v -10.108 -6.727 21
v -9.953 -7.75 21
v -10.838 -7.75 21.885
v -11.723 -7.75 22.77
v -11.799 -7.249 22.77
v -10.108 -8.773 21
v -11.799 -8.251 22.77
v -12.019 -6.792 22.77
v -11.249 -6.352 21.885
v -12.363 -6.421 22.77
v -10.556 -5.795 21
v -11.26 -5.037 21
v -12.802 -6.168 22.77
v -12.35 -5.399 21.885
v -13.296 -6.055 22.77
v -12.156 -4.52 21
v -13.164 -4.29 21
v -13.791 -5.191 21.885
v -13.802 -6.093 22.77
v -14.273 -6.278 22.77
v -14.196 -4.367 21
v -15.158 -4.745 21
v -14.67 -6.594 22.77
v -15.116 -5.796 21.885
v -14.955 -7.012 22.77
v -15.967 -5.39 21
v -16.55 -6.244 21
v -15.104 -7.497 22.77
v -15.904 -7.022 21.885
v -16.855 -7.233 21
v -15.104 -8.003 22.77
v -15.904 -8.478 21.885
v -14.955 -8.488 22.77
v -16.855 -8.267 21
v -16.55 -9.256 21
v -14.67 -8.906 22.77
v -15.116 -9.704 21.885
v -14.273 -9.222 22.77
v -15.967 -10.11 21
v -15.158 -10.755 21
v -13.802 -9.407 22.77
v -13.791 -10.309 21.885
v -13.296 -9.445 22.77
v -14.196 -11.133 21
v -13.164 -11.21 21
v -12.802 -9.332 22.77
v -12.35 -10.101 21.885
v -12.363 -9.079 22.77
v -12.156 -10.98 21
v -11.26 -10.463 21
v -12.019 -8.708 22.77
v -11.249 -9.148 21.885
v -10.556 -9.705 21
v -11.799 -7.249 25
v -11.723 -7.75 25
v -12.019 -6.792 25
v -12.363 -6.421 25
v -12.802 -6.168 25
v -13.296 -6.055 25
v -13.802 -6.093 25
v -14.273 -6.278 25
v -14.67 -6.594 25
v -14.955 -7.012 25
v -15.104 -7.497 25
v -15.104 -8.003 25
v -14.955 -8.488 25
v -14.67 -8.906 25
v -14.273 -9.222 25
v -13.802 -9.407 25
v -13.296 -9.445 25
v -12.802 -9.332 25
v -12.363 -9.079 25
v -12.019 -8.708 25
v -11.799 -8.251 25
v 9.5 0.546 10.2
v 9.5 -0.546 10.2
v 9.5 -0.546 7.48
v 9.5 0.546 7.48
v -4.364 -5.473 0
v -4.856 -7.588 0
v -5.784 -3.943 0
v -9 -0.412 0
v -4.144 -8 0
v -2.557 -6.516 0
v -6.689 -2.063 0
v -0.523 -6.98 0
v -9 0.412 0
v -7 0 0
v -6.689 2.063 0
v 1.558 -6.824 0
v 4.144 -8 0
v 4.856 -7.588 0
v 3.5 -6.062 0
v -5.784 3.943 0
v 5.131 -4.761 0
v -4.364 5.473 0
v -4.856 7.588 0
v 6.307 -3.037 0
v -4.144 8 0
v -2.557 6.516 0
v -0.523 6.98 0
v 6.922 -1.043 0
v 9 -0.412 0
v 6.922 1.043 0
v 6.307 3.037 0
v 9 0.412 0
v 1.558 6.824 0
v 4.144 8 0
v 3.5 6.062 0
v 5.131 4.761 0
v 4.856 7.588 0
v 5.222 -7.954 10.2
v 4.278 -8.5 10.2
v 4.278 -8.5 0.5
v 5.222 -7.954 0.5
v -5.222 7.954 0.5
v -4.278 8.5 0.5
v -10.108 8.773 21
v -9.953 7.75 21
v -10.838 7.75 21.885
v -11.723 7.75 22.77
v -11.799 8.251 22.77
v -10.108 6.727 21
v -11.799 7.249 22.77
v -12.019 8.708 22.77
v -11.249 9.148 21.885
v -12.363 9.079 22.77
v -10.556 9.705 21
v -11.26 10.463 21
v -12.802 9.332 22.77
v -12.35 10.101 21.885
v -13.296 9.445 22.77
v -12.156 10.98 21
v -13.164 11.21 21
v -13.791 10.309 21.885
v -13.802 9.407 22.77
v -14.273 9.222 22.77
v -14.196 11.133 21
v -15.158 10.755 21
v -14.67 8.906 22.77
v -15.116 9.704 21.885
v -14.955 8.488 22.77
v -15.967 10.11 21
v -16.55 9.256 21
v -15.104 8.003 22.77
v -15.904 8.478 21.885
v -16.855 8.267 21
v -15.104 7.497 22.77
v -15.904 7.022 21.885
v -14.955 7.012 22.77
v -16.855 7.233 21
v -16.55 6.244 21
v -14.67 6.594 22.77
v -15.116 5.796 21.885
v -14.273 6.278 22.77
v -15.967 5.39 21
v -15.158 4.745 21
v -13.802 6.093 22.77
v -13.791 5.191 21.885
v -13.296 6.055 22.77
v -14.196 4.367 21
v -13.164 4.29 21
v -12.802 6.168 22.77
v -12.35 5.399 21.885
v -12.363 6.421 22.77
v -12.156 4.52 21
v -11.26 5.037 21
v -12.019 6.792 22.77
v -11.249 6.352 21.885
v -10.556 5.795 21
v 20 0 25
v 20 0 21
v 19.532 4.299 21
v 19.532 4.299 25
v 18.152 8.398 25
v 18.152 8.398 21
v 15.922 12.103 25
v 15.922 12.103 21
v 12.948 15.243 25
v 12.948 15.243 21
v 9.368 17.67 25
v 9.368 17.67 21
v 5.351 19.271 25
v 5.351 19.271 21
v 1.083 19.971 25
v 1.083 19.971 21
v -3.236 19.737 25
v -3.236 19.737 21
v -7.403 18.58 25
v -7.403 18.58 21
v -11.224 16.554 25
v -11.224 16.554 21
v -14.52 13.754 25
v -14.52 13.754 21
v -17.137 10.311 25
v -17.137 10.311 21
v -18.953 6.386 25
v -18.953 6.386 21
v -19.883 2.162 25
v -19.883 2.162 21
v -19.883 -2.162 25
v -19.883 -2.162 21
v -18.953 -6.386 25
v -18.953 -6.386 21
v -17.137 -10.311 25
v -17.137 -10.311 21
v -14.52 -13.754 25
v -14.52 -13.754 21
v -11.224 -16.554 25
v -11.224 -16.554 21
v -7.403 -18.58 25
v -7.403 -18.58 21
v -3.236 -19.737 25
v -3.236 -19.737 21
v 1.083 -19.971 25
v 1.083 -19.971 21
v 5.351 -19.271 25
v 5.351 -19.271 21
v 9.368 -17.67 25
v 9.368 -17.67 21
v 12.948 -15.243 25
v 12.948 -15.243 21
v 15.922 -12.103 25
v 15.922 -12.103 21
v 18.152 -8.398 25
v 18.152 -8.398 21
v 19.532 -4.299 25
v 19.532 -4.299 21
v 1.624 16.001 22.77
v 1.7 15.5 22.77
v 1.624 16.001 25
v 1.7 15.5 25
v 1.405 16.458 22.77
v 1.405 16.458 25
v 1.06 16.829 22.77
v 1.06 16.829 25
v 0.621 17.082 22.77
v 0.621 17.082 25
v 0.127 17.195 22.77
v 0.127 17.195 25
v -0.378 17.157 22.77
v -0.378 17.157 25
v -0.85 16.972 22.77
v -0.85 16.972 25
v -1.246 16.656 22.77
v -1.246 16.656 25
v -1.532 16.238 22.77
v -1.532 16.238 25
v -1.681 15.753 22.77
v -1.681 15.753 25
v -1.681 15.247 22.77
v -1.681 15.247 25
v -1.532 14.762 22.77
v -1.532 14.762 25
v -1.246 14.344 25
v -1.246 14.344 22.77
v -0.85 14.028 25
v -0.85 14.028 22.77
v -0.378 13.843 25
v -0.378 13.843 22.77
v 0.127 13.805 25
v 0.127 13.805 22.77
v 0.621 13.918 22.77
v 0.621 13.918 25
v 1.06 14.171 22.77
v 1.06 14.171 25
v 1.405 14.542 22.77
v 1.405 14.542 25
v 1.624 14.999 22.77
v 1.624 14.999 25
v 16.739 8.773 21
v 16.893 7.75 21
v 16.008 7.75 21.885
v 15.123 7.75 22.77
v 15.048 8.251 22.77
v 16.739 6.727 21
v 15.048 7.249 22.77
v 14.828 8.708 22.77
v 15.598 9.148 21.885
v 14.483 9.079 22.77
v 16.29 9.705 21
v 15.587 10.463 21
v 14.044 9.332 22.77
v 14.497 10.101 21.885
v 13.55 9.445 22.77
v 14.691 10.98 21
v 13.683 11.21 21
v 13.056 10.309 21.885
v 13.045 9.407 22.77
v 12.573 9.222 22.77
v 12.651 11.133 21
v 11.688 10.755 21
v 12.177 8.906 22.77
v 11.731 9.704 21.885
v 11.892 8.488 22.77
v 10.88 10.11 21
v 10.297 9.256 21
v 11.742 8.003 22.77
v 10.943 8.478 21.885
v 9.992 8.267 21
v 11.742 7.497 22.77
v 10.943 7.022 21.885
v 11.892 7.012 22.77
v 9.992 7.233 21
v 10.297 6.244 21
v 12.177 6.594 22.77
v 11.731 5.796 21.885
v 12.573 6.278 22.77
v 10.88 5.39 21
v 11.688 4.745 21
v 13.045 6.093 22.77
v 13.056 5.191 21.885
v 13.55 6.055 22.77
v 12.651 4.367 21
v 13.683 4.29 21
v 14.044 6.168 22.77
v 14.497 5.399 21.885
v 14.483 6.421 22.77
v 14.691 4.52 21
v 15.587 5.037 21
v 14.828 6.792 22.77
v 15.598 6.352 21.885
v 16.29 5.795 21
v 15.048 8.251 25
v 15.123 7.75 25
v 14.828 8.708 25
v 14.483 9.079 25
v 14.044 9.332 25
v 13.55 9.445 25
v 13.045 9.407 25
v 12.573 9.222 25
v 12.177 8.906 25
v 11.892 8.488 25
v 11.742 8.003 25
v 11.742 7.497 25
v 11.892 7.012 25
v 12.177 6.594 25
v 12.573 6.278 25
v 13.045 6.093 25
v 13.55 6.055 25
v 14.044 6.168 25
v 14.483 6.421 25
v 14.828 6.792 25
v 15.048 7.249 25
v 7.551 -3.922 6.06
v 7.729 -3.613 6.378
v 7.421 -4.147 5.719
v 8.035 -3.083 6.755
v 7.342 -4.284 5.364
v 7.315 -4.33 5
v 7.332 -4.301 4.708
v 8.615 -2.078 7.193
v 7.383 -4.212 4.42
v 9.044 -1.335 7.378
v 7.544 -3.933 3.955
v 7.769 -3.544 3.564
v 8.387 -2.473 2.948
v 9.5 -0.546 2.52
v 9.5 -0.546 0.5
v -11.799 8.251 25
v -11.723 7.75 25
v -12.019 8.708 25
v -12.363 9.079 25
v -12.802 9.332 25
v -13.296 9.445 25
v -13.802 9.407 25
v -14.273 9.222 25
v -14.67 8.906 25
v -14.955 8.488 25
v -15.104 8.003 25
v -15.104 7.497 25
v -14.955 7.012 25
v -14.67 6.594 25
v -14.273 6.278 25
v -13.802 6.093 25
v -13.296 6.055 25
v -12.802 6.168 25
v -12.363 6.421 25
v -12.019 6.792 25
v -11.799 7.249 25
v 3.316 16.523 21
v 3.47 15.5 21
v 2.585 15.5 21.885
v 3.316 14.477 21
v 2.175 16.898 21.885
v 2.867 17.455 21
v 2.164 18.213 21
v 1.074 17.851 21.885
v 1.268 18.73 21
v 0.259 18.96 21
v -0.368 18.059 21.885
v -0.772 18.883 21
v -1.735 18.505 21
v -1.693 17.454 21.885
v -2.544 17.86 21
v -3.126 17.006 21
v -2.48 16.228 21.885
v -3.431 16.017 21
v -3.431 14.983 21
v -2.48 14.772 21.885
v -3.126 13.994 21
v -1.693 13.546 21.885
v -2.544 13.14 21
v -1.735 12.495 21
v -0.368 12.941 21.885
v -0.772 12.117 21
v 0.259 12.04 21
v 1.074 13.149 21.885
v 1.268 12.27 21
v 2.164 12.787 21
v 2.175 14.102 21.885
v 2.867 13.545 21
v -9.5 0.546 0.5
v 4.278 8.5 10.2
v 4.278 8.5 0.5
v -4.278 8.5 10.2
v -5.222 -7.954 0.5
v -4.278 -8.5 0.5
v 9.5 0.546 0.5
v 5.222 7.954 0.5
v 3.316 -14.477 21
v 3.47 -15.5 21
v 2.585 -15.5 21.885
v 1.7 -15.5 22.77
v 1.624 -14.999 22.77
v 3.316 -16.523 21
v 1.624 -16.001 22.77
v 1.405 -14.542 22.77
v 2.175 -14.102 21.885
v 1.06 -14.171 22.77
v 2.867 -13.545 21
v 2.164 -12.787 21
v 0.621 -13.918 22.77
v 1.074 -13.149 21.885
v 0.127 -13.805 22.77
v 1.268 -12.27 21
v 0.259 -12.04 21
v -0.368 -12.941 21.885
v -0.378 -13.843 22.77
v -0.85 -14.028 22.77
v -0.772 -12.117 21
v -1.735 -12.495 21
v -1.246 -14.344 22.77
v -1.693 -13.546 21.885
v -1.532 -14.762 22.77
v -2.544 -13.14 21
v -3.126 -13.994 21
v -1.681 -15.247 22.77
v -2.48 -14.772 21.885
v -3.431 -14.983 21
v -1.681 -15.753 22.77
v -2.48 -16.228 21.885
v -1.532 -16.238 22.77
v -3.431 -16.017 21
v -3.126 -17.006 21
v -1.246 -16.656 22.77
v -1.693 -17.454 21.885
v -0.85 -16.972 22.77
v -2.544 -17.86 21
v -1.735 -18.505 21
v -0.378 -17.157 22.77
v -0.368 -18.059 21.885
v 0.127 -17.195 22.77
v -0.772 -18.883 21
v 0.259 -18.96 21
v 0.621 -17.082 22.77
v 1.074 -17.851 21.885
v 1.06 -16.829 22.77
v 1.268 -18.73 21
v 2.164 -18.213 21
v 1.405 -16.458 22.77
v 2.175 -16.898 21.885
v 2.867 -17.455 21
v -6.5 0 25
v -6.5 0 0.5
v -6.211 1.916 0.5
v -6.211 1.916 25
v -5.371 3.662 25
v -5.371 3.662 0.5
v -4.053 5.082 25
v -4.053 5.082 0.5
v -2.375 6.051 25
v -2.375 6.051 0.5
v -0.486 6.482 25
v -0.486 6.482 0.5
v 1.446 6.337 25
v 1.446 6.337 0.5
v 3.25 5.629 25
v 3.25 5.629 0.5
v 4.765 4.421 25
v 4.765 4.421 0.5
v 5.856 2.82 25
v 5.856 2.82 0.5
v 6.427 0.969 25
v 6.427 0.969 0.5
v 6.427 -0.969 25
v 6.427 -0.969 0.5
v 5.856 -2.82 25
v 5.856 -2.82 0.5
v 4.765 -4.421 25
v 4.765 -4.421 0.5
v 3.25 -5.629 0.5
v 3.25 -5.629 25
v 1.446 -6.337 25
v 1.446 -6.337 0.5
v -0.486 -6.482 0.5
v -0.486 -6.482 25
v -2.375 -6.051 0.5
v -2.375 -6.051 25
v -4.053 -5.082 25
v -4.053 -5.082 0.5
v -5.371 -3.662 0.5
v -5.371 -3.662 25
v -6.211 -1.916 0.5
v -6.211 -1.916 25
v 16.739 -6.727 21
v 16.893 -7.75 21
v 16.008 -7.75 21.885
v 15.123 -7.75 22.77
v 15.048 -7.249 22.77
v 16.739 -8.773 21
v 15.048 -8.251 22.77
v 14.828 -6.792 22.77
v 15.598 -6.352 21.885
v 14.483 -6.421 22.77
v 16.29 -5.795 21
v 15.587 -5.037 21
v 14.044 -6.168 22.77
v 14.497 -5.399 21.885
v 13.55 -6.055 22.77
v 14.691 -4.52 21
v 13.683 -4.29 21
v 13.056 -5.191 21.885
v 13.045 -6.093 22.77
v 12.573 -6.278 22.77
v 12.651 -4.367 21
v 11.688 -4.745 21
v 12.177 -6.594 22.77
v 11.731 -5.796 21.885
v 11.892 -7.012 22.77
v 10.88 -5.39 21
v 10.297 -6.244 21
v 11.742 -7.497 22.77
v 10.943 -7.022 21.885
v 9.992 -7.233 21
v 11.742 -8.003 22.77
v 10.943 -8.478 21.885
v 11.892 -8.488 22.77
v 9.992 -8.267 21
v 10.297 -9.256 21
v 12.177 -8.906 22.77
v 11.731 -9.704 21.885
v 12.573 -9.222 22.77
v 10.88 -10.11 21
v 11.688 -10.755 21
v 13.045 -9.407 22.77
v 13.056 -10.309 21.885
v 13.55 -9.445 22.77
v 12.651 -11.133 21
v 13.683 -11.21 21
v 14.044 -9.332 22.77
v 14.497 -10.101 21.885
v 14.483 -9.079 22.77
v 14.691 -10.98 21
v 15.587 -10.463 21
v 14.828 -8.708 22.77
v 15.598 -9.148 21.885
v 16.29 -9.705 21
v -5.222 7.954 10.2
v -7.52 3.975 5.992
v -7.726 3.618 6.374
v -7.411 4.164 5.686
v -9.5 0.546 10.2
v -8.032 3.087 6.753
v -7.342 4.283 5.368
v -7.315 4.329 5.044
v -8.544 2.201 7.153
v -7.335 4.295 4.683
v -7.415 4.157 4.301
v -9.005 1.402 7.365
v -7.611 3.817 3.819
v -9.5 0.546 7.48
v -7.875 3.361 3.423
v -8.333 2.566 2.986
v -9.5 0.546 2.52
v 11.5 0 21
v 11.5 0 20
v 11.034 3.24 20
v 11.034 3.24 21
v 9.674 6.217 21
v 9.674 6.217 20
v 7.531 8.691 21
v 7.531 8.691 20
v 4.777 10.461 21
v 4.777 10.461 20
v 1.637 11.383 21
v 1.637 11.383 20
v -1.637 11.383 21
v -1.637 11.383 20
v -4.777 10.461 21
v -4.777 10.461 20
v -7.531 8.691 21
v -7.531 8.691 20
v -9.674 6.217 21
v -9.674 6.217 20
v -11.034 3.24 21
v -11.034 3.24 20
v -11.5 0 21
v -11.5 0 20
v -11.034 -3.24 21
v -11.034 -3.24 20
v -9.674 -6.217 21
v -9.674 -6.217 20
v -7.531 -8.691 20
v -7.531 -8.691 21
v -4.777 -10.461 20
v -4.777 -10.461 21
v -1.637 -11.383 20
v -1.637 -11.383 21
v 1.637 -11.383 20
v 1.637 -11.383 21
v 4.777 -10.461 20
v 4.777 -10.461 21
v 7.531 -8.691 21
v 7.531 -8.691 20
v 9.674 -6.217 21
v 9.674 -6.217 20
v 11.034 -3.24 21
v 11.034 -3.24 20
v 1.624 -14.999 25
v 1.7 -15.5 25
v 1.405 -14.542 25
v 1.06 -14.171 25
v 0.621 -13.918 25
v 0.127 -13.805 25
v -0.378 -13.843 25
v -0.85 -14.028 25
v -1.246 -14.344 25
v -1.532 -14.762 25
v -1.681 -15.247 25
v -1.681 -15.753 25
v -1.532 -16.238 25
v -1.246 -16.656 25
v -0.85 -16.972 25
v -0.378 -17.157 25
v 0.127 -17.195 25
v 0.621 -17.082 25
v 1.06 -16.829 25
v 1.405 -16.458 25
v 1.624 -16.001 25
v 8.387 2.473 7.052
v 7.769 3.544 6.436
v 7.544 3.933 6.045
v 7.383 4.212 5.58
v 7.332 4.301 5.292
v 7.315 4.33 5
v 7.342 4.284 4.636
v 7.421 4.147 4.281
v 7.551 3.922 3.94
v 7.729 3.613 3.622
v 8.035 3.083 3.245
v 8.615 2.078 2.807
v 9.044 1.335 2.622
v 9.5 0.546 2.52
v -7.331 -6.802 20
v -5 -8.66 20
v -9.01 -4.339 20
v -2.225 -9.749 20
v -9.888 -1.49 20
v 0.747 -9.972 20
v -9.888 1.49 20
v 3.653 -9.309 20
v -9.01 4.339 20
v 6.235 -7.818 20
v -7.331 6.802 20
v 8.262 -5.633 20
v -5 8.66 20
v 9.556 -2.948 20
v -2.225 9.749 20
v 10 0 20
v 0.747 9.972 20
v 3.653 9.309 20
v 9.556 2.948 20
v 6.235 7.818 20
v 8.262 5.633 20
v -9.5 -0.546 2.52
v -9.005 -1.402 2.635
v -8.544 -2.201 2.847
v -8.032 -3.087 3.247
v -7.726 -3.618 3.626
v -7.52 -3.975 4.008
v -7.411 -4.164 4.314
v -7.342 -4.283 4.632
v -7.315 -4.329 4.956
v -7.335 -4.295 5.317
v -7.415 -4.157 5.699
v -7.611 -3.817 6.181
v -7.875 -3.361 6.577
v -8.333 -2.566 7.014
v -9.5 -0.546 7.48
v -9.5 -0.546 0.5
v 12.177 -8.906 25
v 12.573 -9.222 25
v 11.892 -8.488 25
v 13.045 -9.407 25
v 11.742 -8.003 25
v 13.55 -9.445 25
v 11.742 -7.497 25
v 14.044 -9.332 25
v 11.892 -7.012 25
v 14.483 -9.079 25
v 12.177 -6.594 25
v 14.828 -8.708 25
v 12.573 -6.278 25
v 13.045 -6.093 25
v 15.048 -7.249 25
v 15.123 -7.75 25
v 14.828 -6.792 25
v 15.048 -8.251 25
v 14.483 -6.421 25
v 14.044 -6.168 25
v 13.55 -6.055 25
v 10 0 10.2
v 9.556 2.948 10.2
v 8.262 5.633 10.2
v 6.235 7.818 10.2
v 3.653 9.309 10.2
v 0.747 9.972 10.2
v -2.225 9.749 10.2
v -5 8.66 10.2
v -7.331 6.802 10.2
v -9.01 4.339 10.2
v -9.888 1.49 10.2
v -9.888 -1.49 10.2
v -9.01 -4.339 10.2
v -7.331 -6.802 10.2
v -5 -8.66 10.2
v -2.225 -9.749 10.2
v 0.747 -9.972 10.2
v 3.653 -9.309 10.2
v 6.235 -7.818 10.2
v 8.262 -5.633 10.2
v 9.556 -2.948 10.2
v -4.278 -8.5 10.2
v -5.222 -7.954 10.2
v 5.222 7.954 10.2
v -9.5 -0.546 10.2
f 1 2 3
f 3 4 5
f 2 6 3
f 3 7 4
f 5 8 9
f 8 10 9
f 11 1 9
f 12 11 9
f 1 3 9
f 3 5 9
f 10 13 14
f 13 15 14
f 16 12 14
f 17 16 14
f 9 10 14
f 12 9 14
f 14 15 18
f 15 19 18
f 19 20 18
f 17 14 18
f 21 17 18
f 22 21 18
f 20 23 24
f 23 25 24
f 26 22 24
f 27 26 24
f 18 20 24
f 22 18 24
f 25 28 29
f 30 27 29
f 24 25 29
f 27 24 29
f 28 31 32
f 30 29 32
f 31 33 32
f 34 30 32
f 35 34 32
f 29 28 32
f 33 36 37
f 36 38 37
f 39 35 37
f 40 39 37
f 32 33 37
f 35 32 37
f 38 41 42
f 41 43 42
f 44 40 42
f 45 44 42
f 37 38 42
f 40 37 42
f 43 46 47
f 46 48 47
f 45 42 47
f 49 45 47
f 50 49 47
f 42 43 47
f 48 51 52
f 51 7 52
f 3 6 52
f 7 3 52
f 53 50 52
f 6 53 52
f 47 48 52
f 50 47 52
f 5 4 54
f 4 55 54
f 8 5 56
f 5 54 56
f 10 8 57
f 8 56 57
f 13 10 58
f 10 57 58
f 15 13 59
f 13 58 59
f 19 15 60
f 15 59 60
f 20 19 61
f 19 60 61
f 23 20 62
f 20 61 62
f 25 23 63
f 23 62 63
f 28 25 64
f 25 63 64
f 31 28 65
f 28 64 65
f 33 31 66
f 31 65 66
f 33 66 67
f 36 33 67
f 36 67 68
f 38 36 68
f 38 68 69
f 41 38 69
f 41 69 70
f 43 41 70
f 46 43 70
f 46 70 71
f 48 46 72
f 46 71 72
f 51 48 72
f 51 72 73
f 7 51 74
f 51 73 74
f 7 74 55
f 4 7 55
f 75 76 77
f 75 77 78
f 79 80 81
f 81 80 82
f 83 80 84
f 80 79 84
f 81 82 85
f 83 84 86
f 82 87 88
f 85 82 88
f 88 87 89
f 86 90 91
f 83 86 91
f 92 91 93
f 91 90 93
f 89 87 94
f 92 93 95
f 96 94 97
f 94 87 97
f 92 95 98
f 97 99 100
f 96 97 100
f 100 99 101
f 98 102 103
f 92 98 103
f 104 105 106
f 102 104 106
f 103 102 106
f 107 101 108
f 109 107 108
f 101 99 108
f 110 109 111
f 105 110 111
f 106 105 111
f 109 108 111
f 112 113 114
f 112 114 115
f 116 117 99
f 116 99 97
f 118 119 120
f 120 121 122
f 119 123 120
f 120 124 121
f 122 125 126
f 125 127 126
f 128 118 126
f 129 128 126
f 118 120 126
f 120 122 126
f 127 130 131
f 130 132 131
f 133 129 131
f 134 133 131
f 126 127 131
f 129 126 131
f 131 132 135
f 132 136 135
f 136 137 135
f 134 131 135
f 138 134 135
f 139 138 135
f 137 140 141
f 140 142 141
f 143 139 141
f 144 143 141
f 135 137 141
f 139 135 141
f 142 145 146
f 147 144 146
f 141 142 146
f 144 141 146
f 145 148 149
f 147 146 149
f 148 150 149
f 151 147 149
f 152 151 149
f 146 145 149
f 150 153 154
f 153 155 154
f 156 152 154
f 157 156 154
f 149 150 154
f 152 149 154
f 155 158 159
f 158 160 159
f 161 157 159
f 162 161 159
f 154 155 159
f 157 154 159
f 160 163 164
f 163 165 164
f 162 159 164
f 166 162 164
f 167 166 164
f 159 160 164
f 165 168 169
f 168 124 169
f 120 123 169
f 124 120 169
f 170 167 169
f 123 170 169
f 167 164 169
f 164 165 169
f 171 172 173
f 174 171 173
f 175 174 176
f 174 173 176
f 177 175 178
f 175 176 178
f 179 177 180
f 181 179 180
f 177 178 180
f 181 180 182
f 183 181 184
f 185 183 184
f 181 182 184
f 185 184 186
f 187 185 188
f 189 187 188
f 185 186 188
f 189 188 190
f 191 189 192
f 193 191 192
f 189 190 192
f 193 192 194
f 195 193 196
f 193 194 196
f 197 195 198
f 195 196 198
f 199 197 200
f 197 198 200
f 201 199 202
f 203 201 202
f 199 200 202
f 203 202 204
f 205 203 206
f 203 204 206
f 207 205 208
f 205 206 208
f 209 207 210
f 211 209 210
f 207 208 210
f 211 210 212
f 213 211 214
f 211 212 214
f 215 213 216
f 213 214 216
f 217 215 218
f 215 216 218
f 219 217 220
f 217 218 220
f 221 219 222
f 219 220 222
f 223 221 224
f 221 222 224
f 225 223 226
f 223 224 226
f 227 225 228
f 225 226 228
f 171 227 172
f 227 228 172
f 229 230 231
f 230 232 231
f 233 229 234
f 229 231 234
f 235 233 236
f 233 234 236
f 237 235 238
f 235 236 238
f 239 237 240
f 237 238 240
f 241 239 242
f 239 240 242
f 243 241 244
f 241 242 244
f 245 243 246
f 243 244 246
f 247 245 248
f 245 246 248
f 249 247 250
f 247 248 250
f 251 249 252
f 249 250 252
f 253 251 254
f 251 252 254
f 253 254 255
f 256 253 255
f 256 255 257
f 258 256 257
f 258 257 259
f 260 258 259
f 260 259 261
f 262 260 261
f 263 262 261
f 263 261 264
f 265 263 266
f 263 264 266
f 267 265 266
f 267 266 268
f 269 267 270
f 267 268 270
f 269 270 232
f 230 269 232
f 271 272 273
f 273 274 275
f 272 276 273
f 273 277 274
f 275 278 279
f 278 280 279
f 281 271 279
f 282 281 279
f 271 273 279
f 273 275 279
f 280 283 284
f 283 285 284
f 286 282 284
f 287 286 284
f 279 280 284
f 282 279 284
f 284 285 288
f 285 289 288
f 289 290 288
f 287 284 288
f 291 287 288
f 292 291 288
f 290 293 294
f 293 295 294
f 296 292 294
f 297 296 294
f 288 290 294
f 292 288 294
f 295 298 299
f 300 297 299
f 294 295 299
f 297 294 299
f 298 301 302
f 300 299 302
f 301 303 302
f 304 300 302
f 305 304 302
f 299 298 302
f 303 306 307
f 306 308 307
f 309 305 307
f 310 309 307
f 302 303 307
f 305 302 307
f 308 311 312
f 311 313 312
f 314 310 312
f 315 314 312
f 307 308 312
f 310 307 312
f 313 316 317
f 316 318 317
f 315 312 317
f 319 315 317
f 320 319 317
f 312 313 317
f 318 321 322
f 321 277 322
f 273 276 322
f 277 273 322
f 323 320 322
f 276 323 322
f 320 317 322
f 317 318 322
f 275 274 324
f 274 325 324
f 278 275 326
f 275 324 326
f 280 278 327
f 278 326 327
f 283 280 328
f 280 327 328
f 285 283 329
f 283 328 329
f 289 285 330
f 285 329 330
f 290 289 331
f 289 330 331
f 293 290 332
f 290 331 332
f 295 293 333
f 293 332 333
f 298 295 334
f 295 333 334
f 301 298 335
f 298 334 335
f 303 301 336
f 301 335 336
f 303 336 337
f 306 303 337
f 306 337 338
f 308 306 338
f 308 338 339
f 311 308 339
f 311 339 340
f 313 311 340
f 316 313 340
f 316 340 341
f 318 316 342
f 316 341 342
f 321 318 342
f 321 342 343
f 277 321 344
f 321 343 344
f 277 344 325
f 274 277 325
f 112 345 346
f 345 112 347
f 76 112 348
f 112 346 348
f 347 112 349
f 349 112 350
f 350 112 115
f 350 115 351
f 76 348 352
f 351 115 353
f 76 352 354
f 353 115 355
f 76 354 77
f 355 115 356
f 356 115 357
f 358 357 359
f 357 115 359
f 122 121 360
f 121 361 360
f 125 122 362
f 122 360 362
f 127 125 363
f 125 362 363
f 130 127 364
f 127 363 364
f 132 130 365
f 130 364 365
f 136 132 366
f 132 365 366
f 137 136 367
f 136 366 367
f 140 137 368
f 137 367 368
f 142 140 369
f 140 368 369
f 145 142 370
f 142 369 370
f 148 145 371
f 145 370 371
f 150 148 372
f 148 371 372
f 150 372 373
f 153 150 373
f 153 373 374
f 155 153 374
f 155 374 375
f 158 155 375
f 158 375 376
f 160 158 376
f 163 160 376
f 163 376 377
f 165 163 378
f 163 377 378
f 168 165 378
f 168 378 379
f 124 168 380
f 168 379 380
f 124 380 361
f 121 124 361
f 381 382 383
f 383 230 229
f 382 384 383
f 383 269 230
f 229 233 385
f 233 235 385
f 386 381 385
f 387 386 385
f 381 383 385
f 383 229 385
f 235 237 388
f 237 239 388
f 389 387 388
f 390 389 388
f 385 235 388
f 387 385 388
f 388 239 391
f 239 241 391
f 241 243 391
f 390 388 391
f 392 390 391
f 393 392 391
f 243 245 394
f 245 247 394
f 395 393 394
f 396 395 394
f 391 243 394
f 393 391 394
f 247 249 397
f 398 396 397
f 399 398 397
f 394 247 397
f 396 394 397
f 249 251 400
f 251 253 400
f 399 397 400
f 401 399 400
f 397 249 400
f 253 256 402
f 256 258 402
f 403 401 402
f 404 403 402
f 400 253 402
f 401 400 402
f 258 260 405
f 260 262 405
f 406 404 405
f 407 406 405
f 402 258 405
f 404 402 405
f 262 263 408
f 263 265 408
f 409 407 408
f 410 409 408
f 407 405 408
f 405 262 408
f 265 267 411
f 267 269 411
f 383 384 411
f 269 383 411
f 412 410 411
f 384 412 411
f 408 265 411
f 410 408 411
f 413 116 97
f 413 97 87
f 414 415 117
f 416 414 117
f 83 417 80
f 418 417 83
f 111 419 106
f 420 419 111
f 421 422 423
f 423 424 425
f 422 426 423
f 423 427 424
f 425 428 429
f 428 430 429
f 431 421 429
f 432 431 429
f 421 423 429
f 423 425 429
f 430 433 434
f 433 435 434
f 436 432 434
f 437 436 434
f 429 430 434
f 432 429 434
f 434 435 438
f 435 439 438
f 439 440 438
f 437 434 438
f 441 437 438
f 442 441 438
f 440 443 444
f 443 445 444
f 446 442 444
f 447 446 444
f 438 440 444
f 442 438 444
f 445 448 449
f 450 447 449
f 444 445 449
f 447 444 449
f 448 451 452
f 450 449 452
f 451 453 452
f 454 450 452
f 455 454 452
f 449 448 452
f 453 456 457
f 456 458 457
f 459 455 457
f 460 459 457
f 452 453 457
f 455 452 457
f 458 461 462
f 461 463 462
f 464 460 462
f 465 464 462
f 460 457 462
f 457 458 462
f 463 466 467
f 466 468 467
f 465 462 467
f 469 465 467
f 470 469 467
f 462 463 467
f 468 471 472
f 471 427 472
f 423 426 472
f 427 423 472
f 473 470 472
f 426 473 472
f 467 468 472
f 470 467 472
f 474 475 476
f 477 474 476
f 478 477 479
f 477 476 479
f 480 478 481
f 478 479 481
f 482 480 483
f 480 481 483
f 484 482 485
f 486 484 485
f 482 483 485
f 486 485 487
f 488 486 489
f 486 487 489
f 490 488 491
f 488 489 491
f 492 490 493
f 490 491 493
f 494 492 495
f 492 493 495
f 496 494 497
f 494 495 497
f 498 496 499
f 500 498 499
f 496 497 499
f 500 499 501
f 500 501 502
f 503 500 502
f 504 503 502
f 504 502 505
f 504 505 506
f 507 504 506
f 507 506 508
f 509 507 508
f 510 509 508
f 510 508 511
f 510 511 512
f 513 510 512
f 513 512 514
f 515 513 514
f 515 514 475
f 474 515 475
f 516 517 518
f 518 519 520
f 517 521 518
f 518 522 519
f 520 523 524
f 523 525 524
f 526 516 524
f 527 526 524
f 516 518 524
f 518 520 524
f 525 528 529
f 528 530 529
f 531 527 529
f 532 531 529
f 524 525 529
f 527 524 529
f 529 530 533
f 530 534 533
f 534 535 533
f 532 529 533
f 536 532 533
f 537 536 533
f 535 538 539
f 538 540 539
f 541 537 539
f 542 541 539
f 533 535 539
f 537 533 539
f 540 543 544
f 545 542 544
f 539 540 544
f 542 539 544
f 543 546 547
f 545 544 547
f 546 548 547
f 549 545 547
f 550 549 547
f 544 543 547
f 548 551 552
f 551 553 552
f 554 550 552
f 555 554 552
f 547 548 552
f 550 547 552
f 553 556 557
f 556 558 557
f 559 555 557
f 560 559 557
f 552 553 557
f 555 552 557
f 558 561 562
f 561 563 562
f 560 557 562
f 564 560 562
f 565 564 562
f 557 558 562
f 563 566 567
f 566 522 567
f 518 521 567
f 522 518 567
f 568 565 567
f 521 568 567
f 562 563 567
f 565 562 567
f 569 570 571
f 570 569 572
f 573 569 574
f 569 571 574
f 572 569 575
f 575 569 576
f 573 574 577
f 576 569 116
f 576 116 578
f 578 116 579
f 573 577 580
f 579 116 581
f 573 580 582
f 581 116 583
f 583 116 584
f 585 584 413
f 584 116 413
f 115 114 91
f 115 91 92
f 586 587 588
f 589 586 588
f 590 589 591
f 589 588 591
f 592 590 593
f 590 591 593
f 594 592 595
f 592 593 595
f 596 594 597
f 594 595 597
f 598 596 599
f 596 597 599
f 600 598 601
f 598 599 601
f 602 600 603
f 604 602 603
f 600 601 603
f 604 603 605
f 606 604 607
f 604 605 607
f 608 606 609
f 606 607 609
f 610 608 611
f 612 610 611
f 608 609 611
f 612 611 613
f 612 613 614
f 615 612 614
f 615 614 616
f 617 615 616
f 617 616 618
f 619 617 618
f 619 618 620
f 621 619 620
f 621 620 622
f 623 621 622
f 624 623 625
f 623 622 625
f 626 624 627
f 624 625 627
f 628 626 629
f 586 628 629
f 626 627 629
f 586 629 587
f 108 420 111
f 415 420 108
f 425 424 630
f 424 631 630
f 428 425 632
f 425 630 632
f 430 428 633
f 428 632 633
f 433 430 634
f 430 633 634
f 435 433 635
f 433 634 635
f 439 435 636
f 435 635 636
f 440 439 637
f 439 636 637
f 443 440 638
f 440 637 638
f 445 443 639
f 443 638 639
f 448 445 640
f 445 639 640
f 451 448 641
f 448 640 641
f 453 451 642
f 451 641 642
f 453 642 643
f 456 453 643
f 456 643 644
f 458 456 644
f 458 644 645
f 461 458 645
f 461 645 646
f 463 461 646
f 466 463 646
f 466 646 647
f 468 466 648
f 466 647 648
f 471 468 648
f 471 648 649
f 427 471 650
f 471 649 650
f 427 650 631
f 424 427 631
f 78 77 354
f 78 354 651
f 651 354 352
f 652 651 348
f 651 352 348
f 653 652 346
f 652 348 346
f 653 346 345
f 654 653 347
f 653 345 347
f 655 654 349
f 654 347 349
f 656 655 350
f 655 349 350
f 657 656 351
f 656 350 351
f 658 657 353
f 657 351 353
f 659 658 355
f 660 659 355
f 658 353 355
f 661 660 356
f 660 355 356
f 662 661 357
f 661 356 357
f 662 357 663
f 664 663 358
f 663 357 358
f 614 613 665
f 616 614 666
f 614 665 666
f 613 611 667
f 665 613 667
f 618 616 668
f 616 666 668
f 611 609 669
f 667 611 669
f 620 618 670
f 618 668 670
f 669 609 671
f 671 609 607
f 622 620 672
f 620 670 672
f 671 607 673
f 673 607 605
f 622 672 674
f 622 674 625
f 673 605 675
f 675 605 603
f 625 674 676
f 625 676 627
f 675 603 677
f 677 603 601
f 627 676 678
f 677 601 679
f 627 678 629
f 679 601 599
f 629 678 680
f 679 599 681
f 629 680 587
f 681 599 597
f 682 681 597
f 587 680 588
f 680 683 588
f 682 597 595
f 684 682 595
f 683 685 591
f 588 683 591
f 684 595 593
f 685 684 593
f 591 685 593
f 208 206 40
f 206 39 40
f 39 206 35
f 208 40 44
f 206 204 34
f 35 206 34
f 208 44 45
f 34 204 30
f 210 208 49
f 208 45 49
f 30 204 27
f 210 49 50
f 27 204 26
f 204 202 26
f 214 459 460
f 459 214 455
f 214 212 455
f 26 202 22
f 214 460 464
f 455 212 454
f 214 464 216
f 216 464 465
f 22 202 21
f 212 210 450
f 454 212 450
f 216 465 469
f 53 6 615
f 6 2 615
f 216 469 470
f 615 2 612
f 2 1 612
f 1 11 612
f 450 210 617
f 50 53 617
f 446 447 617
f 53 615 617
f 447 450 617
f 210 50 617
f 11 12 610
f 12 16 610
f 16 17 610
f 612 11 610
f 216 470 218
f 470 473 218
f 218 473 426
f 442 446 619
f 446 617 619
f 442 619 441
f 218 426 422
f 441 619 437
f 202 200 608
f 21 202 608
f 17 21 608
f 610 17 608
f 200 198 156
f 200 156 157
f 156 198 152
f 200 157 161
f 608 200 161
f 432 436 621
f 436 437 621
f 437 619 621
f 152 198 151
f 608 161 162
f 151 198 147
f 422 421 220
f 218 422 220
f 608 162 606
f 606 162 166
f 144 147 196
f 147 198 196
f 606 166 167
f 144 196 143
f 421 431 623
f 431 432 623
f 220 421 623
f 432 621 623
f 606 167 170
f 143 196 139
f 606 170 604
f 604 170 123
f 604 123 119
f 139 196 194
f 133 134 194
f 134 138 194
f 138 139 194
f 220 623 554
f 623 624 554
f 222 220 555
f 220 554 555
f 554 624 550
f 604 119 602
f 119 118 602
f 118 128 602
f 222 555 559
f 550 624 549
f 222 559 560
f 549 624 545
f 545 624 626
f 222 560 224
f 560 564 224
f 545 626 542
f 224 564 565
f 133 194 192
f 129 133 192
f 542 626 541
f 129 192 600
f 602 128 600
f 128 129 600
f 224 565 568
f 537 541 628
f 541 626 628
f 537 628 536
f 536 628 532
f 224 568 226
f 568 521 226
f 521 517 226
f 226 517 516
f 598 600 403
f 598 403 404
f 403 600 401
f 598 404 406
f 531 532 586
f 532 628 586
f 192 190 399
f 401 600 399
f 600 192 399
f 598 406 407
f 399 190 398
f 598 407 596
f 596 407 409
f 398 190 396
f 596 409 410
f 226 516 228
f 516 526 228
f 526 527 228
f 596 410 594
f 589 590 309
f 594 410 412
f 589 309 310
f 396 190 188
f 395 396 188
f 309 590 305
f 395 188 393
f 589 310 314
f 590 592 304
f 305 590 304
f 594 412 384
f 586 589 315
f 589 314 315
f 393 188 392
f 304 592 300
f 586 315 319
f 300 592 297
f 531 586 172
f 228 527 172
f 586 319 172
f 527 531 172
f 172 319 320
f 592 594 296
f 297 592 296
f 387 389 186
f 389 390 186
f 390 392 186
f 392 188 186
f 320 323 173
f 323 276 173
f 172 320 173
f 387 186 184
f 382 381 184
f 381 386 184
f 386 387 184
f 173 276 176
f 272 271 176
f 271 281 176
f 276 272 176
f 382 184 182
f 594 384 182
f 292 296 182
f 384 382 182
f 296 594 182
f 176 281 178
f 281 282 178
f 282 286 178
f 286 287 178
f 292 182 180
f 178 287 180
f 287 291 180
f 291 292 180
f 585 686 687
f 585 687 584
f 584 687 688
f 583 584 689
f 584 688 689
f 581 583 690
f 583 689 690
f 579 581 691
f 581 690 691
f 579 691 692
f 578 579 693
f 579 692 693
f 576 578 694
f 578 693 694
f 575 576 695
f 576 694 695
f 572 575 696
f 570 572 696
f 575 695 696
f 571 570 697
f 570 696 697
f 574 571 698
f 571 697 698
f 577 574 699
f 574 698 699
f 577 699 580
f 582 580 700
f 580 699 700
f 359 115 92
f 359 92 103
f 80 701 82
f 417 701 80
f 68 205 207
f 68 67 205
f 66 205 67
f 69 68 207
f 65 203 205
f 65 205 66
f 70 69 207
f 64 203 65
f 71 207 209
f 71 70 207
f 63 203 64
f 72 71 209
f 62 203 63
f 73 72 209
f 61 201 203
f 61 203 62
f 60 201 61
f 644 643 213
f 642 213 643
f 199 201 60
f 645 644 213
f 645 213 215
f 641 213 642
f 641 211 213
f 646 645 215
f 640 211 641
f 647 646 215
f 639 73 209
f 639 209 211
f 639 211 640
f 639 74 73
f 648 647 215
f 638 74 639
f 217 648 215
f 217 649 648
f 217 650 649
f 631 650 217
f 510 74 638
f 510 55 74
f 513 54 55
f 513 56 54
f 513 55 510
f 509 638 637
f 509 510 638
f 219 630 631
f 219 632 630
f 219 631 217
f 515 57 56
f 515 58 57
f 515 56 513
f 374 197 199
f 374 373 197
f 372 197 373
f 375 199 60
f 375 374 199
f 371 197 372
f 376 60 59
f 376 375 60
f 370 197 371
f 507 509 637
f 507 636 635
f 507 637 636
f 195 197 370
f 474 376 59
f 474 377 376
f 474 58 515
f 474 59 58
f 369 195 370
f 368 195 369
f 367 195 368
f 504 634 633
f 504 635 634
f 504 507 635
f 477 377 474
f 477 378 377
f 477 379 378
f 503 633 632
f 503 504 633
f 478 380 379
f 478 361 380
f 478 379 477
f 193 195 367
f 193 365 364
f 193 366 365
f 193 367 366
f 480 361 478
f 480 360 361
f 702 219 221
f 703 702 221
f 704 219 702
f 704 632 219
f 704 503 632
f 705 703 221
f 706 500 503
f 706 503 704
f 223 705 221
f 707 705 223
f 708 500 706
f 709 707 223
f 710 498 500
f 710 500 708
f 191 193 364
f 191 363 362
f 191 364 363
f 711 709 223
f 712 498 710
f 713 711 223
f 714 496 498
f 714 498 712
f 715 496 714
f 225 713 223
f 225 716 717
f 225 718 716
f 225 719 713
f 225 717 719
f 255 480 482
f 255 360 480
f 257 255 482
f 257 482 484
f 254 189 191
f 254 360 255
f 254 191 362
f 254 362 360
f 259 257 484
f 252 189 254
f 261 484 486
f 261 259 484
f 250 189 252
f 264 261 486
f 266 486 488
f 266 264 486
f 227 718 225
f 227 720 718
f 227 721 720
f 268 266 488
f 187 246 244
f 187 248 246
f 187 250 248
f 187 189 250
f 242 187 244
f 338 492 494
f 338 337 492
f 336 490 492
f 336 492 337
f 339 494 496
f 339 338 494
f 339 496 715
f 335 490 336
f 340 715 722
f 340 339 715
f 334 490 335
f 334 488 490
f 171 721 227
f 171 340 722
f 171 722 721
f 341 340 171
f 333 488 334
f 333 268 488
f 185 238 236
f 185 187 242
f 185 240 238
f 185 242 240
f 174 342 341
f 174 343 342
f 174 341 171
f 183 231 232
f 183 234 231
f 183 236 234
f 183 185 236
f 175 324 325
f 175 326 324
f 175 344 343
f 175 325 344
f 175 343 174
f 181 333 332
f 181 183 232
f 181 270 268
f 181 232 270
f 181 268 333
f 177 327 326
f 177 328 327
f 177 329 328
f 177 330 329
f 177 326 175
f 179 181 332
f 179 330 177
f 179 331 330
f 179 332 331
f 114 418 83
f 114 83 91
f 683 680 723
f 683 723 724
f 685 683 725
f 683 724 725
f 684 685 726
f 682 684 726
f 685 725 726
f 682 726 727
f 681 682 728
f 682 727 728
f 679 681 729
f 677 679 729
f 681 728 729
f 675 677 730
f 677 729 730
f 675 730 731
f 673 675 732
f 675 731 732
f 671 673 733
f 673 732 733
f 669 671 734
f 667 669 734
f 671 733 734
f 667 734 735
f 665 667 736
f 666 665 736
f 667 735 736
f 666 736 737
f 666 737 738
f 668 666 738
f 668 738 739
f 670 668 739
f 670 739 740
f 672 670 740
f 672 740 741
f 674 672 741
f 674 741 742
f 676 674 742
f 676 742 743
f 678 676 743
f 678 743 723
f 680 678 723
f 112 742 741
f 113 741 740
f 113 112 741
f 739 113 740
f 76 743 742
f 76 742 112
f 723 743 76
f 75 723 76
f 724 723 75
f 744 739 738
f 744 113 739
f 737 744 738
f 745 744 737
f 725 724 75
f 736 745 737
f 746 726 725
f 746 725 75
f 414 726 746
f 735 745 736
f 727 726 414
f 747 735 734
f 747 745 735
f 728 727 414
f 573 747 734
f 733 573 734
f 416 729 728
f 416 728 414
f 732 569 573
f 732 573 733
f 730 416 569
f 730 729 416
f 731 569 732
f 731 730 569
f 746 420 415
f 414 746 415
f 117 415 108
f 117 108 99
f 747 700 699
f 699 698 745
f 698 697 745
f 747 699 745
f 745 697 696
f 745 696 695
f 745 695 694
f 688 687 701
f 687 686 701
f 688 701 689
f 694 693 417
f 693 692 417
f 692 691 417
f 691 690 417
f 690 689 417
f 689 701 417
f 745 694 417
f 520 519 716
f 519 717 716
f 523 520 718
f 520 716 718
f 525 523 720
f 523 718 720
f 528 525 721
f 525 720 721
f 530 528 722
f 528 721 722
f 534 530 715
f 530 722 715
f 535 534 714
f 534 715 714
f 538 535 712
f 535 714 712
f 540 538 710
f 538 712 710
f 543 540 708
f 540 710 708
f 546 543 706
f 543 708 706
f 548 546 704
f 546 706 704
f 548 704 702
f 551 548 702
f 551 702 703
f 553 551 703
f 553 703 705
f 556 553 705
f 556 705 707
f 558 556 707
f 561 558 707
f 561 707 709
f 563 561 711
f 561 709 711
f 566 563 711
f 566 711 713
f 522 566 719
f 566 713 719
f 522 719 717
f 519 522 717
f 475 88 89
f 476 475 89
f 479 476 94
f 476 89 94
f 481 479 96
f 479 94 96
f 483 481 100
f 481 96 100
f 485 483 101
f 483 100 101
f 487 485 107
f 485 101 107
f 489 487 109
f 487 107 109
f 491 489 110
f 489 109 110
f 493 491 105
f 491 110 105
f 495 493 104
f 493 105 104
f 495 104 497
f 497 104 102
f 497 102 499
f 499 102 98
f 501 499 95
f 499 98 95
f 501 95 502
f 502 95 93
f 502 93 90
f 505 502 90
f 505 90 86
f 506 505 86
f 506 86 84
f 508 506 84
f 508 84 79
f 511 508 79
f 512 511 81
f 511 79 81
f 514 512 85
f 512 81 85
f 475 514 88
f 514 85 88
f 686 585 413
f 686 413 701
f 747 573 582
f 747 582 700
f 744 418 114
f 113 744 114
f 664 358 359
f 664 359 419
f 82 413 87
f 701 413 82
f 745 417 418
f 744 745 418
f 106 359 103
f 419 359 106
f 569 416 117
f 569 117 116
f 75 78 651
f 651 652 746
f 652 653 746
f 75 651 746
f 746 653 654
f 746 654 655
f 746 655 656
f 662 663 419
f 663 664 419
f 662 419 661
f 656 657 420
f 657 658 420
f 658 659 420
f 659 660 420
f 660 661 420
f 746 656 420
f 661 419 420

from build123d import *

# Parameters (mm, degrees)
BOSS_EXTRUDE1_DEPTH                                  = 10
F_5_0MM_DOWEL_HOLE1_D                                = 5
F_5_0MM_DOWEL_HOLE1_CSINK_D                          = 5.05
F_5_0MM_DOWEL_HOLE1_CSINK_ANGLE                      = 90
SKETCH5_R                                            = 10
BOSS_EXTRUDE2_DEPTH                                  = 10
SKETCH6_R                                            = 11.5
BOSS_EXTRUDE3_DEPTH                                  = 1
SKETCH7_R                                            = 20
BOSS_EXTRUDE4_DEPTH                                  = 4
CSK_FOR_M3_HEX_SOCKET_COUNTERSUNK_HEAD_S_D           = 3.4
CSK_FOR_M3_HEX_SOCKET_COUNTERSUNK_HEAD_S_CSINK_D     = 6.94
CSK_FOR_M3_HEX_SOCKET_COUNTERSUNK_HEAD_S_CSINK_ANGLE = 90
F_13_0_13_DIAMETER_HOLE1_D                           = 13
SKETCH12_R                                           = 10
CUT_EXTRUDE1_DEPTH                                   = 0.2
CUT_EXTRUDE2_START                                   = -10.2
CUT_EXTRUDE2_DEPTH                                   = 10.2
CHAMFER1_SIZE                                        = 0.5


with BuildPart() as part:
    # Sketch1 → Boss-Extrude1 (new body)
    with BuildSketch(Plane.XY):
        Polygon((-4.907477288, 8.5), (-9.814954576, 0), (-4.907477288, -8.5), (4.907477288, -8.5), (9.814954576, 0), (4.907477288, 8.5), align=None)
    extrude(amount=BOSS_EXTRUDE1_DEPTH)

    # Ø5.0mm Dowel Hole1 (through all)
    with Locations(Plane(origin=(0, 8.5, 0), x_dir=(1, 0, 0), z_dir=(0, 1, 0))):
        with Locations((-9.814954576, -5), (9.814954576, -5)):
            CounterSinkHole(F_5_0MM_DOWEL_HOLE1_D / 2, F_5_0MM_DOWEL_HOLE1_CSINK_D / 2, counter_sink_angle=F_5_0MM_DOWEL_HOLE1_CSINK_ANGLE)

    # Sketch5 → Boss-Extrude2 (add)
    with BuildSketch(Plane.XY.offset(10)):
        Circle(SKETCH5_R)
    extrude(amount=BOSS_EXTRUDE2_DEPTH)

    # Sketch6 → Boss-Extrude3 (add)
    with BuildSketch(Plane.XY.offset(20)):
        Circle(SKETCH6_R)
    extrude(amount=BOSS_EXTRUDE3_DEPTH)

    # Sketch7 → Boss-Extrude4 (add)
    with BuildSketch(Plane.XY.offset(21)):
        Circle(SKETCH7_R)
    extrude(amount=BOSS_EXTRUDE4_DEPTH)

    # CSK for M3 Hex Socket Countersunk Head Screw1 (through all)
    with Locations(Plane(origin=(0, 0, 21), x_dir=(-1, 0, 0), z_dir=(0, 0, -1))):
        with Locations((0, 15.5), (13.423393759, 7.75), (13.423393759, -7.75), (0, -15.5), (-13.423393759, -7.75), (-13.423393759, 7.75)):
            CounterSinkHole(CSK_FOR_M3_HEX_SOCKET_COUNTERSUNK_HEAD_S_D / 2, CSK_FOR_M3_HEX_SOCKET_COUNTERSUNK_HEAD_S_CSINK_D / 2, counter_sink_angle=CSK_FOR_M3_HEX_SOCKET_COUNTERSUNK_HEAD_S_CSINK_ANGLE)

    # Ø13.0 (13) Diameter Hole1 (through all)
    with Locations(Plane.XY.offset(25)):
        with Locations((0, 0)):
            Hole(F_13_0_13_DIAMETER_HOLE1_D / 2)

    # Sketch12 → Cut-Extrude1 (cut)
    with BuildSketch(Plane(origin=(0, 0, 10), x_dir=(-1, 0, 0), z_dir=(0, 0, -1))):
        Circle(SKETCH12_R)
        Polygon((4.907477288, 8.5), (-4.907477288, 8.5), (-9.814954576, 0), (-4.907477288, -8.5), (4.907477288, -8.5), (9.814954576, 0), align=None, mode=Mode.SUBTRACT)
    extrude(amount=-CUT_EXTRUDE1_DEPTH, mode=Mode.SUBTRACT)

    # Sketch13 → Cut-Extrude2 (cut)
    with BuildSketch(Plane(origin=(0, 0, 0), x_dir=(-1, 0, 0), z_dir=(0, 0, -1)).offset(CUT_EXTRUDE2_START)):
        Polygon((-5.222431864, 7.954482672), (-4.277568136, 8.5), (-4.907477288, 8.5), align=None)
        Polygon((4.907477288, 8.5), (4.277568136, 8.5), (5.222431864, 7.954482672), align=None)
        Polygon((-9.5, -0.545517328), (-9.5, 0.545517328), (-9.814954576, 0), align=None)
        Polygon((9.814954576, 0), (9.5, 0.545517328), (9.5, -0.545517328), align=None)
        Polygon((-4.277568136, -8.5), (-5.222431864, -7.954482672), (-4.907477288, -8.5), align=None)
        Polygon((4.907477288, -8.5), (5.222431864, -7.954482672), (4.277568136, -8.5), align=None)
    extrude(amount=CUT_EXTRUDE2_DEPTH, mode=Mode.SUBTRACT)

    # Chamfer1
    chamfer1_edges = [part.edges().sort_by_distance(p)[0] for p in [
        (6.5, 0, 0),
        (0, 8.5, 0),
        (7.361215932, 4.25, 0),
        (7.361215932, -4.25, 0),
        (0, -8.5, 0),
        (-7.361215932, -4.25, 0),
        (-7.361215932, 4.25, 0),
        (9.5, 0, 0),
        (4.75, -8.227241336, 0),
        (-4.75, -8.227241336, 0),
        (-9.5, 0, 0),
        (-4.75, 8.227241336, 0),
        (4.75, 8.227241336, 0),
    ]]
    chamfer(chamfer1_edges, length=CHAMFER1_SIZE)


solid = part.part
